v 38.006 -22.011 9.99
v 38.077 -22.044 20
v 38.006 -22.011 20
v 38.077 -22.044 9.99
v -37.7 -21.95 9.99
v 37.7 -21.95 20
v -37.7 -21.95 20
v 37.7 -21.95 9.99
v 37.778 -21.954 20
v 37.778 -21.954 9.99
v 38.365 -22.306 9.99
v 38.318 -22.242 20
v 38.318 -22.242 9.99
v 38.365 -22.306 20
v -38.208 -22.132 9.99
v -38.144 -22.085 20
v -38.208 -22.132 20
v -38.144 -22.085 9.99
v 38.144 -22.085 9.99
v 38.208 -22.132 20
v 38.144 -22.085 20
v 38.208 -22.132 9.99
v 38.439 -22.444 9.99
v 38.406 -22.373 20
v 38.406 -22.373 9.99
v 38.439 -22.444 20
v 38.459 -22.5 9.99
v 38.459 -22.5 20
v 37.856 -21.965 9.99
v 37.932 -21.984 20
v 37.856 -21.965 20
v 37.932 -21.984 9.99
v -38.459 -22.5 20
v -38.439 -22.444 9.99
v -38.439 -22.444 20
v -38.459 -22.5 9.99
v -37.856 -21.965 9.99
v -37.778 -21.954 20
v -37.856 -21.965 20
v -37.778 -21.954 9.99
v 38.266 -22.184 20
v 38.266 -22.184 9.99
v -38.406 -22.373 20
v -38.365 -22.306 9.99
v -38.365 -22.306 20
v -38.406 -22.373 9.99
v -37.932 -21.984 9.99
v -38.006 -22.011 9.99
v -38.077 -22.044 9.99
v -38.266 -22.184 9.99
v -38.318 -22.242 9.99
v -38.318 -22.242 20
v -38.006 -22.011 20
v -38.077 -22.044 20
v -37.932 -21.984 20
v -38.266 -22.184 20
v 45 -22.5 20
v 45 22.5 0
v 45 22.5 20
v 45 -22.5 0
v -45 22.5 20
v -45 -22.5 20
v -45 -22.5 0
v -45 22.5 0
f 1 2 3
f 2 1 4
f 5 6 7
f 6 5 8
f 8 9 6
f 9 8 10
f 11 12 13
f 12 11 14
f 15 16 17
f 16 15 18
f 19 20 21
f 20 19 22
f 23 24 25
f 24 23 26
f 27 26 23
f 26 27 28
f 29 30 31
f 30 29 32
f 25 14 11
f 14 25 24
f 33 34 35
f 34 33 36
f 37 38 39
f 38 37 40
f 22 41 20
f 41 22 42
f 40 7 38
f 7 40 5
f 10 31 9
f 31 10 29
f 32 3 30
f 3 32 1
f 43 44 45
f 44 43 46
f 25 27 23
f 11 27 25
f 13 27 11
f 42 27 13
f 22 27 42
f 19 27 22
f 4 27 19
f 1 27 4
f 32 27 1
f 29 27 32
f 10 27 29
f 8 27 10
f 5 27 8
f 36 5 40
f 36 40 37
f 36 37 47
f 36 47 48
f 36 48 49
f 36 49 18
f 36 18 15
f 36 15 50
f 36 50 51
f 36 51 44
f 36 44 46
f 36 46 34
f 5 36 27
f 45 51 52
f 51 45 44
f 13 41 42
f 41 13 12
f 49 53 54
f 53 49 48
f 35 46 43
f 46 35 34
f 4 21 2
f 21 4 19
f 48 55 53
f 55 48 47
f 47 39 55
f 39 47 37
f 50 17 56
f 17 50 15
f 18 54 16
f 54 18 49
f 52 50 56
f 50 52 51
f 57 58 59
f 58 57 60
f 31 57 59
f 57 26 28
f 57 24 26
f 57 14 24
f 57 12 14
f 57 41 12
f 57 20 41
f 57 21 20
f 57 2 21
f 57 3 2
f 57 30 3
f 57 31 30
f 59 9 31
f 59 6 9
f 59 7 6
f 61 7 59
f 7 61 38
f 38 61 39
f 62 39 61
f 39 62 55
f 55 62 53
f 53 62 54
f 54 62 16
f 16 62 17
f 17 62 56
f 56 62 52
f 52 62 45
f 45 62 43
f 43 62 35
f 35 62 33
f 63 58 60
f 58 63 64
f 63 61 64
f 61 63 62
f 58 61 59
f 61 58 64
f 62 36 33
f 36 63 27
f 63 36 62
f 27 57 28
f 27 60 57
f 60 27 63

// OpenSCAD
// Built by bench/smallmodels/features/compiler.py from a list of features.
$fn = 64;
difference() {
  union() {
    translate([0, 0, 0]) translate([-45, -22.5, 0]) cube([90, 45, 20]);
  }
  union() {
    translate([0, -54.25, 9.99]) rotate([0, 0, 0]) hull() { for (s = [-1, 1]) translate([s * 37.7, 0, 0]) cylinder(d = 1.6, h = 10.02); }
    translate([0, -50.75, 9.99]) rotate([0, 0, 0]) hull() { for (s = [-1, 1]) translate([s * 37.7, 0, 0]) cylinder(d = 1.6, h = 10.02); }
    translate([0, -47.25, 9.99]) rotate([0, 0, 0]) hull() { for (s = [-1, 1]) translate([s * 37.7, 0, 0]) cylinder(d = 1.6, h = 10.02); }
    translate([0, -43.75, 9.99]) rotate([0, 0, 0]) hull() { for (s = [-1, 1]) translate([s * 37.7, 0, 0]) cylinder(d = 1.6, h = 10.02); }
    translate([0, -40.25, 9.99]) rotate([0, 0, 0]) hull() { for (s = [-1, 1]) translate([s * 37.7, 0, 0]) cylinder(d = 1.6, h = 10.02); }
    translate([0, -36.75, 9.99]) rotate([0, 0, 0]) hull() { for (s = [-1, 1]) translate([s * 37.7, 0, 0]) cylinder(d = 1.6, h = 10.02); }
    translate([0, -33.25, 9.99]) rotate([0, 0, 0]) hull() { for (s = [-1, 1]) translate([s * 37.7, 0, 0]) cylinder(d = 1.6, h = 10.02); }
    translate([0, -29.75, 9.99]) rotate([0, 0, 0]) hull() { for (s = [-1, 1]) translate([s * 37.7, 0, 0]) cylinder(d = 1.6, h = 10.02); }
    translate([0, -26.25, 9.99]) rotate([0, 0, 0]) hull() { for (s = [-1, 1]) translate([s * 37.7, 0, 0]) cylinder(d = 1.6, h = 10.02); }
    translate([0, -22.75, 9.99]) rotate([0, 0, 0]) hull() { for (s = [-1, 1]) translate([s * 37.7, 0, 0]) cylinder(d = 1.6, h = 10.02); }
  }
}
